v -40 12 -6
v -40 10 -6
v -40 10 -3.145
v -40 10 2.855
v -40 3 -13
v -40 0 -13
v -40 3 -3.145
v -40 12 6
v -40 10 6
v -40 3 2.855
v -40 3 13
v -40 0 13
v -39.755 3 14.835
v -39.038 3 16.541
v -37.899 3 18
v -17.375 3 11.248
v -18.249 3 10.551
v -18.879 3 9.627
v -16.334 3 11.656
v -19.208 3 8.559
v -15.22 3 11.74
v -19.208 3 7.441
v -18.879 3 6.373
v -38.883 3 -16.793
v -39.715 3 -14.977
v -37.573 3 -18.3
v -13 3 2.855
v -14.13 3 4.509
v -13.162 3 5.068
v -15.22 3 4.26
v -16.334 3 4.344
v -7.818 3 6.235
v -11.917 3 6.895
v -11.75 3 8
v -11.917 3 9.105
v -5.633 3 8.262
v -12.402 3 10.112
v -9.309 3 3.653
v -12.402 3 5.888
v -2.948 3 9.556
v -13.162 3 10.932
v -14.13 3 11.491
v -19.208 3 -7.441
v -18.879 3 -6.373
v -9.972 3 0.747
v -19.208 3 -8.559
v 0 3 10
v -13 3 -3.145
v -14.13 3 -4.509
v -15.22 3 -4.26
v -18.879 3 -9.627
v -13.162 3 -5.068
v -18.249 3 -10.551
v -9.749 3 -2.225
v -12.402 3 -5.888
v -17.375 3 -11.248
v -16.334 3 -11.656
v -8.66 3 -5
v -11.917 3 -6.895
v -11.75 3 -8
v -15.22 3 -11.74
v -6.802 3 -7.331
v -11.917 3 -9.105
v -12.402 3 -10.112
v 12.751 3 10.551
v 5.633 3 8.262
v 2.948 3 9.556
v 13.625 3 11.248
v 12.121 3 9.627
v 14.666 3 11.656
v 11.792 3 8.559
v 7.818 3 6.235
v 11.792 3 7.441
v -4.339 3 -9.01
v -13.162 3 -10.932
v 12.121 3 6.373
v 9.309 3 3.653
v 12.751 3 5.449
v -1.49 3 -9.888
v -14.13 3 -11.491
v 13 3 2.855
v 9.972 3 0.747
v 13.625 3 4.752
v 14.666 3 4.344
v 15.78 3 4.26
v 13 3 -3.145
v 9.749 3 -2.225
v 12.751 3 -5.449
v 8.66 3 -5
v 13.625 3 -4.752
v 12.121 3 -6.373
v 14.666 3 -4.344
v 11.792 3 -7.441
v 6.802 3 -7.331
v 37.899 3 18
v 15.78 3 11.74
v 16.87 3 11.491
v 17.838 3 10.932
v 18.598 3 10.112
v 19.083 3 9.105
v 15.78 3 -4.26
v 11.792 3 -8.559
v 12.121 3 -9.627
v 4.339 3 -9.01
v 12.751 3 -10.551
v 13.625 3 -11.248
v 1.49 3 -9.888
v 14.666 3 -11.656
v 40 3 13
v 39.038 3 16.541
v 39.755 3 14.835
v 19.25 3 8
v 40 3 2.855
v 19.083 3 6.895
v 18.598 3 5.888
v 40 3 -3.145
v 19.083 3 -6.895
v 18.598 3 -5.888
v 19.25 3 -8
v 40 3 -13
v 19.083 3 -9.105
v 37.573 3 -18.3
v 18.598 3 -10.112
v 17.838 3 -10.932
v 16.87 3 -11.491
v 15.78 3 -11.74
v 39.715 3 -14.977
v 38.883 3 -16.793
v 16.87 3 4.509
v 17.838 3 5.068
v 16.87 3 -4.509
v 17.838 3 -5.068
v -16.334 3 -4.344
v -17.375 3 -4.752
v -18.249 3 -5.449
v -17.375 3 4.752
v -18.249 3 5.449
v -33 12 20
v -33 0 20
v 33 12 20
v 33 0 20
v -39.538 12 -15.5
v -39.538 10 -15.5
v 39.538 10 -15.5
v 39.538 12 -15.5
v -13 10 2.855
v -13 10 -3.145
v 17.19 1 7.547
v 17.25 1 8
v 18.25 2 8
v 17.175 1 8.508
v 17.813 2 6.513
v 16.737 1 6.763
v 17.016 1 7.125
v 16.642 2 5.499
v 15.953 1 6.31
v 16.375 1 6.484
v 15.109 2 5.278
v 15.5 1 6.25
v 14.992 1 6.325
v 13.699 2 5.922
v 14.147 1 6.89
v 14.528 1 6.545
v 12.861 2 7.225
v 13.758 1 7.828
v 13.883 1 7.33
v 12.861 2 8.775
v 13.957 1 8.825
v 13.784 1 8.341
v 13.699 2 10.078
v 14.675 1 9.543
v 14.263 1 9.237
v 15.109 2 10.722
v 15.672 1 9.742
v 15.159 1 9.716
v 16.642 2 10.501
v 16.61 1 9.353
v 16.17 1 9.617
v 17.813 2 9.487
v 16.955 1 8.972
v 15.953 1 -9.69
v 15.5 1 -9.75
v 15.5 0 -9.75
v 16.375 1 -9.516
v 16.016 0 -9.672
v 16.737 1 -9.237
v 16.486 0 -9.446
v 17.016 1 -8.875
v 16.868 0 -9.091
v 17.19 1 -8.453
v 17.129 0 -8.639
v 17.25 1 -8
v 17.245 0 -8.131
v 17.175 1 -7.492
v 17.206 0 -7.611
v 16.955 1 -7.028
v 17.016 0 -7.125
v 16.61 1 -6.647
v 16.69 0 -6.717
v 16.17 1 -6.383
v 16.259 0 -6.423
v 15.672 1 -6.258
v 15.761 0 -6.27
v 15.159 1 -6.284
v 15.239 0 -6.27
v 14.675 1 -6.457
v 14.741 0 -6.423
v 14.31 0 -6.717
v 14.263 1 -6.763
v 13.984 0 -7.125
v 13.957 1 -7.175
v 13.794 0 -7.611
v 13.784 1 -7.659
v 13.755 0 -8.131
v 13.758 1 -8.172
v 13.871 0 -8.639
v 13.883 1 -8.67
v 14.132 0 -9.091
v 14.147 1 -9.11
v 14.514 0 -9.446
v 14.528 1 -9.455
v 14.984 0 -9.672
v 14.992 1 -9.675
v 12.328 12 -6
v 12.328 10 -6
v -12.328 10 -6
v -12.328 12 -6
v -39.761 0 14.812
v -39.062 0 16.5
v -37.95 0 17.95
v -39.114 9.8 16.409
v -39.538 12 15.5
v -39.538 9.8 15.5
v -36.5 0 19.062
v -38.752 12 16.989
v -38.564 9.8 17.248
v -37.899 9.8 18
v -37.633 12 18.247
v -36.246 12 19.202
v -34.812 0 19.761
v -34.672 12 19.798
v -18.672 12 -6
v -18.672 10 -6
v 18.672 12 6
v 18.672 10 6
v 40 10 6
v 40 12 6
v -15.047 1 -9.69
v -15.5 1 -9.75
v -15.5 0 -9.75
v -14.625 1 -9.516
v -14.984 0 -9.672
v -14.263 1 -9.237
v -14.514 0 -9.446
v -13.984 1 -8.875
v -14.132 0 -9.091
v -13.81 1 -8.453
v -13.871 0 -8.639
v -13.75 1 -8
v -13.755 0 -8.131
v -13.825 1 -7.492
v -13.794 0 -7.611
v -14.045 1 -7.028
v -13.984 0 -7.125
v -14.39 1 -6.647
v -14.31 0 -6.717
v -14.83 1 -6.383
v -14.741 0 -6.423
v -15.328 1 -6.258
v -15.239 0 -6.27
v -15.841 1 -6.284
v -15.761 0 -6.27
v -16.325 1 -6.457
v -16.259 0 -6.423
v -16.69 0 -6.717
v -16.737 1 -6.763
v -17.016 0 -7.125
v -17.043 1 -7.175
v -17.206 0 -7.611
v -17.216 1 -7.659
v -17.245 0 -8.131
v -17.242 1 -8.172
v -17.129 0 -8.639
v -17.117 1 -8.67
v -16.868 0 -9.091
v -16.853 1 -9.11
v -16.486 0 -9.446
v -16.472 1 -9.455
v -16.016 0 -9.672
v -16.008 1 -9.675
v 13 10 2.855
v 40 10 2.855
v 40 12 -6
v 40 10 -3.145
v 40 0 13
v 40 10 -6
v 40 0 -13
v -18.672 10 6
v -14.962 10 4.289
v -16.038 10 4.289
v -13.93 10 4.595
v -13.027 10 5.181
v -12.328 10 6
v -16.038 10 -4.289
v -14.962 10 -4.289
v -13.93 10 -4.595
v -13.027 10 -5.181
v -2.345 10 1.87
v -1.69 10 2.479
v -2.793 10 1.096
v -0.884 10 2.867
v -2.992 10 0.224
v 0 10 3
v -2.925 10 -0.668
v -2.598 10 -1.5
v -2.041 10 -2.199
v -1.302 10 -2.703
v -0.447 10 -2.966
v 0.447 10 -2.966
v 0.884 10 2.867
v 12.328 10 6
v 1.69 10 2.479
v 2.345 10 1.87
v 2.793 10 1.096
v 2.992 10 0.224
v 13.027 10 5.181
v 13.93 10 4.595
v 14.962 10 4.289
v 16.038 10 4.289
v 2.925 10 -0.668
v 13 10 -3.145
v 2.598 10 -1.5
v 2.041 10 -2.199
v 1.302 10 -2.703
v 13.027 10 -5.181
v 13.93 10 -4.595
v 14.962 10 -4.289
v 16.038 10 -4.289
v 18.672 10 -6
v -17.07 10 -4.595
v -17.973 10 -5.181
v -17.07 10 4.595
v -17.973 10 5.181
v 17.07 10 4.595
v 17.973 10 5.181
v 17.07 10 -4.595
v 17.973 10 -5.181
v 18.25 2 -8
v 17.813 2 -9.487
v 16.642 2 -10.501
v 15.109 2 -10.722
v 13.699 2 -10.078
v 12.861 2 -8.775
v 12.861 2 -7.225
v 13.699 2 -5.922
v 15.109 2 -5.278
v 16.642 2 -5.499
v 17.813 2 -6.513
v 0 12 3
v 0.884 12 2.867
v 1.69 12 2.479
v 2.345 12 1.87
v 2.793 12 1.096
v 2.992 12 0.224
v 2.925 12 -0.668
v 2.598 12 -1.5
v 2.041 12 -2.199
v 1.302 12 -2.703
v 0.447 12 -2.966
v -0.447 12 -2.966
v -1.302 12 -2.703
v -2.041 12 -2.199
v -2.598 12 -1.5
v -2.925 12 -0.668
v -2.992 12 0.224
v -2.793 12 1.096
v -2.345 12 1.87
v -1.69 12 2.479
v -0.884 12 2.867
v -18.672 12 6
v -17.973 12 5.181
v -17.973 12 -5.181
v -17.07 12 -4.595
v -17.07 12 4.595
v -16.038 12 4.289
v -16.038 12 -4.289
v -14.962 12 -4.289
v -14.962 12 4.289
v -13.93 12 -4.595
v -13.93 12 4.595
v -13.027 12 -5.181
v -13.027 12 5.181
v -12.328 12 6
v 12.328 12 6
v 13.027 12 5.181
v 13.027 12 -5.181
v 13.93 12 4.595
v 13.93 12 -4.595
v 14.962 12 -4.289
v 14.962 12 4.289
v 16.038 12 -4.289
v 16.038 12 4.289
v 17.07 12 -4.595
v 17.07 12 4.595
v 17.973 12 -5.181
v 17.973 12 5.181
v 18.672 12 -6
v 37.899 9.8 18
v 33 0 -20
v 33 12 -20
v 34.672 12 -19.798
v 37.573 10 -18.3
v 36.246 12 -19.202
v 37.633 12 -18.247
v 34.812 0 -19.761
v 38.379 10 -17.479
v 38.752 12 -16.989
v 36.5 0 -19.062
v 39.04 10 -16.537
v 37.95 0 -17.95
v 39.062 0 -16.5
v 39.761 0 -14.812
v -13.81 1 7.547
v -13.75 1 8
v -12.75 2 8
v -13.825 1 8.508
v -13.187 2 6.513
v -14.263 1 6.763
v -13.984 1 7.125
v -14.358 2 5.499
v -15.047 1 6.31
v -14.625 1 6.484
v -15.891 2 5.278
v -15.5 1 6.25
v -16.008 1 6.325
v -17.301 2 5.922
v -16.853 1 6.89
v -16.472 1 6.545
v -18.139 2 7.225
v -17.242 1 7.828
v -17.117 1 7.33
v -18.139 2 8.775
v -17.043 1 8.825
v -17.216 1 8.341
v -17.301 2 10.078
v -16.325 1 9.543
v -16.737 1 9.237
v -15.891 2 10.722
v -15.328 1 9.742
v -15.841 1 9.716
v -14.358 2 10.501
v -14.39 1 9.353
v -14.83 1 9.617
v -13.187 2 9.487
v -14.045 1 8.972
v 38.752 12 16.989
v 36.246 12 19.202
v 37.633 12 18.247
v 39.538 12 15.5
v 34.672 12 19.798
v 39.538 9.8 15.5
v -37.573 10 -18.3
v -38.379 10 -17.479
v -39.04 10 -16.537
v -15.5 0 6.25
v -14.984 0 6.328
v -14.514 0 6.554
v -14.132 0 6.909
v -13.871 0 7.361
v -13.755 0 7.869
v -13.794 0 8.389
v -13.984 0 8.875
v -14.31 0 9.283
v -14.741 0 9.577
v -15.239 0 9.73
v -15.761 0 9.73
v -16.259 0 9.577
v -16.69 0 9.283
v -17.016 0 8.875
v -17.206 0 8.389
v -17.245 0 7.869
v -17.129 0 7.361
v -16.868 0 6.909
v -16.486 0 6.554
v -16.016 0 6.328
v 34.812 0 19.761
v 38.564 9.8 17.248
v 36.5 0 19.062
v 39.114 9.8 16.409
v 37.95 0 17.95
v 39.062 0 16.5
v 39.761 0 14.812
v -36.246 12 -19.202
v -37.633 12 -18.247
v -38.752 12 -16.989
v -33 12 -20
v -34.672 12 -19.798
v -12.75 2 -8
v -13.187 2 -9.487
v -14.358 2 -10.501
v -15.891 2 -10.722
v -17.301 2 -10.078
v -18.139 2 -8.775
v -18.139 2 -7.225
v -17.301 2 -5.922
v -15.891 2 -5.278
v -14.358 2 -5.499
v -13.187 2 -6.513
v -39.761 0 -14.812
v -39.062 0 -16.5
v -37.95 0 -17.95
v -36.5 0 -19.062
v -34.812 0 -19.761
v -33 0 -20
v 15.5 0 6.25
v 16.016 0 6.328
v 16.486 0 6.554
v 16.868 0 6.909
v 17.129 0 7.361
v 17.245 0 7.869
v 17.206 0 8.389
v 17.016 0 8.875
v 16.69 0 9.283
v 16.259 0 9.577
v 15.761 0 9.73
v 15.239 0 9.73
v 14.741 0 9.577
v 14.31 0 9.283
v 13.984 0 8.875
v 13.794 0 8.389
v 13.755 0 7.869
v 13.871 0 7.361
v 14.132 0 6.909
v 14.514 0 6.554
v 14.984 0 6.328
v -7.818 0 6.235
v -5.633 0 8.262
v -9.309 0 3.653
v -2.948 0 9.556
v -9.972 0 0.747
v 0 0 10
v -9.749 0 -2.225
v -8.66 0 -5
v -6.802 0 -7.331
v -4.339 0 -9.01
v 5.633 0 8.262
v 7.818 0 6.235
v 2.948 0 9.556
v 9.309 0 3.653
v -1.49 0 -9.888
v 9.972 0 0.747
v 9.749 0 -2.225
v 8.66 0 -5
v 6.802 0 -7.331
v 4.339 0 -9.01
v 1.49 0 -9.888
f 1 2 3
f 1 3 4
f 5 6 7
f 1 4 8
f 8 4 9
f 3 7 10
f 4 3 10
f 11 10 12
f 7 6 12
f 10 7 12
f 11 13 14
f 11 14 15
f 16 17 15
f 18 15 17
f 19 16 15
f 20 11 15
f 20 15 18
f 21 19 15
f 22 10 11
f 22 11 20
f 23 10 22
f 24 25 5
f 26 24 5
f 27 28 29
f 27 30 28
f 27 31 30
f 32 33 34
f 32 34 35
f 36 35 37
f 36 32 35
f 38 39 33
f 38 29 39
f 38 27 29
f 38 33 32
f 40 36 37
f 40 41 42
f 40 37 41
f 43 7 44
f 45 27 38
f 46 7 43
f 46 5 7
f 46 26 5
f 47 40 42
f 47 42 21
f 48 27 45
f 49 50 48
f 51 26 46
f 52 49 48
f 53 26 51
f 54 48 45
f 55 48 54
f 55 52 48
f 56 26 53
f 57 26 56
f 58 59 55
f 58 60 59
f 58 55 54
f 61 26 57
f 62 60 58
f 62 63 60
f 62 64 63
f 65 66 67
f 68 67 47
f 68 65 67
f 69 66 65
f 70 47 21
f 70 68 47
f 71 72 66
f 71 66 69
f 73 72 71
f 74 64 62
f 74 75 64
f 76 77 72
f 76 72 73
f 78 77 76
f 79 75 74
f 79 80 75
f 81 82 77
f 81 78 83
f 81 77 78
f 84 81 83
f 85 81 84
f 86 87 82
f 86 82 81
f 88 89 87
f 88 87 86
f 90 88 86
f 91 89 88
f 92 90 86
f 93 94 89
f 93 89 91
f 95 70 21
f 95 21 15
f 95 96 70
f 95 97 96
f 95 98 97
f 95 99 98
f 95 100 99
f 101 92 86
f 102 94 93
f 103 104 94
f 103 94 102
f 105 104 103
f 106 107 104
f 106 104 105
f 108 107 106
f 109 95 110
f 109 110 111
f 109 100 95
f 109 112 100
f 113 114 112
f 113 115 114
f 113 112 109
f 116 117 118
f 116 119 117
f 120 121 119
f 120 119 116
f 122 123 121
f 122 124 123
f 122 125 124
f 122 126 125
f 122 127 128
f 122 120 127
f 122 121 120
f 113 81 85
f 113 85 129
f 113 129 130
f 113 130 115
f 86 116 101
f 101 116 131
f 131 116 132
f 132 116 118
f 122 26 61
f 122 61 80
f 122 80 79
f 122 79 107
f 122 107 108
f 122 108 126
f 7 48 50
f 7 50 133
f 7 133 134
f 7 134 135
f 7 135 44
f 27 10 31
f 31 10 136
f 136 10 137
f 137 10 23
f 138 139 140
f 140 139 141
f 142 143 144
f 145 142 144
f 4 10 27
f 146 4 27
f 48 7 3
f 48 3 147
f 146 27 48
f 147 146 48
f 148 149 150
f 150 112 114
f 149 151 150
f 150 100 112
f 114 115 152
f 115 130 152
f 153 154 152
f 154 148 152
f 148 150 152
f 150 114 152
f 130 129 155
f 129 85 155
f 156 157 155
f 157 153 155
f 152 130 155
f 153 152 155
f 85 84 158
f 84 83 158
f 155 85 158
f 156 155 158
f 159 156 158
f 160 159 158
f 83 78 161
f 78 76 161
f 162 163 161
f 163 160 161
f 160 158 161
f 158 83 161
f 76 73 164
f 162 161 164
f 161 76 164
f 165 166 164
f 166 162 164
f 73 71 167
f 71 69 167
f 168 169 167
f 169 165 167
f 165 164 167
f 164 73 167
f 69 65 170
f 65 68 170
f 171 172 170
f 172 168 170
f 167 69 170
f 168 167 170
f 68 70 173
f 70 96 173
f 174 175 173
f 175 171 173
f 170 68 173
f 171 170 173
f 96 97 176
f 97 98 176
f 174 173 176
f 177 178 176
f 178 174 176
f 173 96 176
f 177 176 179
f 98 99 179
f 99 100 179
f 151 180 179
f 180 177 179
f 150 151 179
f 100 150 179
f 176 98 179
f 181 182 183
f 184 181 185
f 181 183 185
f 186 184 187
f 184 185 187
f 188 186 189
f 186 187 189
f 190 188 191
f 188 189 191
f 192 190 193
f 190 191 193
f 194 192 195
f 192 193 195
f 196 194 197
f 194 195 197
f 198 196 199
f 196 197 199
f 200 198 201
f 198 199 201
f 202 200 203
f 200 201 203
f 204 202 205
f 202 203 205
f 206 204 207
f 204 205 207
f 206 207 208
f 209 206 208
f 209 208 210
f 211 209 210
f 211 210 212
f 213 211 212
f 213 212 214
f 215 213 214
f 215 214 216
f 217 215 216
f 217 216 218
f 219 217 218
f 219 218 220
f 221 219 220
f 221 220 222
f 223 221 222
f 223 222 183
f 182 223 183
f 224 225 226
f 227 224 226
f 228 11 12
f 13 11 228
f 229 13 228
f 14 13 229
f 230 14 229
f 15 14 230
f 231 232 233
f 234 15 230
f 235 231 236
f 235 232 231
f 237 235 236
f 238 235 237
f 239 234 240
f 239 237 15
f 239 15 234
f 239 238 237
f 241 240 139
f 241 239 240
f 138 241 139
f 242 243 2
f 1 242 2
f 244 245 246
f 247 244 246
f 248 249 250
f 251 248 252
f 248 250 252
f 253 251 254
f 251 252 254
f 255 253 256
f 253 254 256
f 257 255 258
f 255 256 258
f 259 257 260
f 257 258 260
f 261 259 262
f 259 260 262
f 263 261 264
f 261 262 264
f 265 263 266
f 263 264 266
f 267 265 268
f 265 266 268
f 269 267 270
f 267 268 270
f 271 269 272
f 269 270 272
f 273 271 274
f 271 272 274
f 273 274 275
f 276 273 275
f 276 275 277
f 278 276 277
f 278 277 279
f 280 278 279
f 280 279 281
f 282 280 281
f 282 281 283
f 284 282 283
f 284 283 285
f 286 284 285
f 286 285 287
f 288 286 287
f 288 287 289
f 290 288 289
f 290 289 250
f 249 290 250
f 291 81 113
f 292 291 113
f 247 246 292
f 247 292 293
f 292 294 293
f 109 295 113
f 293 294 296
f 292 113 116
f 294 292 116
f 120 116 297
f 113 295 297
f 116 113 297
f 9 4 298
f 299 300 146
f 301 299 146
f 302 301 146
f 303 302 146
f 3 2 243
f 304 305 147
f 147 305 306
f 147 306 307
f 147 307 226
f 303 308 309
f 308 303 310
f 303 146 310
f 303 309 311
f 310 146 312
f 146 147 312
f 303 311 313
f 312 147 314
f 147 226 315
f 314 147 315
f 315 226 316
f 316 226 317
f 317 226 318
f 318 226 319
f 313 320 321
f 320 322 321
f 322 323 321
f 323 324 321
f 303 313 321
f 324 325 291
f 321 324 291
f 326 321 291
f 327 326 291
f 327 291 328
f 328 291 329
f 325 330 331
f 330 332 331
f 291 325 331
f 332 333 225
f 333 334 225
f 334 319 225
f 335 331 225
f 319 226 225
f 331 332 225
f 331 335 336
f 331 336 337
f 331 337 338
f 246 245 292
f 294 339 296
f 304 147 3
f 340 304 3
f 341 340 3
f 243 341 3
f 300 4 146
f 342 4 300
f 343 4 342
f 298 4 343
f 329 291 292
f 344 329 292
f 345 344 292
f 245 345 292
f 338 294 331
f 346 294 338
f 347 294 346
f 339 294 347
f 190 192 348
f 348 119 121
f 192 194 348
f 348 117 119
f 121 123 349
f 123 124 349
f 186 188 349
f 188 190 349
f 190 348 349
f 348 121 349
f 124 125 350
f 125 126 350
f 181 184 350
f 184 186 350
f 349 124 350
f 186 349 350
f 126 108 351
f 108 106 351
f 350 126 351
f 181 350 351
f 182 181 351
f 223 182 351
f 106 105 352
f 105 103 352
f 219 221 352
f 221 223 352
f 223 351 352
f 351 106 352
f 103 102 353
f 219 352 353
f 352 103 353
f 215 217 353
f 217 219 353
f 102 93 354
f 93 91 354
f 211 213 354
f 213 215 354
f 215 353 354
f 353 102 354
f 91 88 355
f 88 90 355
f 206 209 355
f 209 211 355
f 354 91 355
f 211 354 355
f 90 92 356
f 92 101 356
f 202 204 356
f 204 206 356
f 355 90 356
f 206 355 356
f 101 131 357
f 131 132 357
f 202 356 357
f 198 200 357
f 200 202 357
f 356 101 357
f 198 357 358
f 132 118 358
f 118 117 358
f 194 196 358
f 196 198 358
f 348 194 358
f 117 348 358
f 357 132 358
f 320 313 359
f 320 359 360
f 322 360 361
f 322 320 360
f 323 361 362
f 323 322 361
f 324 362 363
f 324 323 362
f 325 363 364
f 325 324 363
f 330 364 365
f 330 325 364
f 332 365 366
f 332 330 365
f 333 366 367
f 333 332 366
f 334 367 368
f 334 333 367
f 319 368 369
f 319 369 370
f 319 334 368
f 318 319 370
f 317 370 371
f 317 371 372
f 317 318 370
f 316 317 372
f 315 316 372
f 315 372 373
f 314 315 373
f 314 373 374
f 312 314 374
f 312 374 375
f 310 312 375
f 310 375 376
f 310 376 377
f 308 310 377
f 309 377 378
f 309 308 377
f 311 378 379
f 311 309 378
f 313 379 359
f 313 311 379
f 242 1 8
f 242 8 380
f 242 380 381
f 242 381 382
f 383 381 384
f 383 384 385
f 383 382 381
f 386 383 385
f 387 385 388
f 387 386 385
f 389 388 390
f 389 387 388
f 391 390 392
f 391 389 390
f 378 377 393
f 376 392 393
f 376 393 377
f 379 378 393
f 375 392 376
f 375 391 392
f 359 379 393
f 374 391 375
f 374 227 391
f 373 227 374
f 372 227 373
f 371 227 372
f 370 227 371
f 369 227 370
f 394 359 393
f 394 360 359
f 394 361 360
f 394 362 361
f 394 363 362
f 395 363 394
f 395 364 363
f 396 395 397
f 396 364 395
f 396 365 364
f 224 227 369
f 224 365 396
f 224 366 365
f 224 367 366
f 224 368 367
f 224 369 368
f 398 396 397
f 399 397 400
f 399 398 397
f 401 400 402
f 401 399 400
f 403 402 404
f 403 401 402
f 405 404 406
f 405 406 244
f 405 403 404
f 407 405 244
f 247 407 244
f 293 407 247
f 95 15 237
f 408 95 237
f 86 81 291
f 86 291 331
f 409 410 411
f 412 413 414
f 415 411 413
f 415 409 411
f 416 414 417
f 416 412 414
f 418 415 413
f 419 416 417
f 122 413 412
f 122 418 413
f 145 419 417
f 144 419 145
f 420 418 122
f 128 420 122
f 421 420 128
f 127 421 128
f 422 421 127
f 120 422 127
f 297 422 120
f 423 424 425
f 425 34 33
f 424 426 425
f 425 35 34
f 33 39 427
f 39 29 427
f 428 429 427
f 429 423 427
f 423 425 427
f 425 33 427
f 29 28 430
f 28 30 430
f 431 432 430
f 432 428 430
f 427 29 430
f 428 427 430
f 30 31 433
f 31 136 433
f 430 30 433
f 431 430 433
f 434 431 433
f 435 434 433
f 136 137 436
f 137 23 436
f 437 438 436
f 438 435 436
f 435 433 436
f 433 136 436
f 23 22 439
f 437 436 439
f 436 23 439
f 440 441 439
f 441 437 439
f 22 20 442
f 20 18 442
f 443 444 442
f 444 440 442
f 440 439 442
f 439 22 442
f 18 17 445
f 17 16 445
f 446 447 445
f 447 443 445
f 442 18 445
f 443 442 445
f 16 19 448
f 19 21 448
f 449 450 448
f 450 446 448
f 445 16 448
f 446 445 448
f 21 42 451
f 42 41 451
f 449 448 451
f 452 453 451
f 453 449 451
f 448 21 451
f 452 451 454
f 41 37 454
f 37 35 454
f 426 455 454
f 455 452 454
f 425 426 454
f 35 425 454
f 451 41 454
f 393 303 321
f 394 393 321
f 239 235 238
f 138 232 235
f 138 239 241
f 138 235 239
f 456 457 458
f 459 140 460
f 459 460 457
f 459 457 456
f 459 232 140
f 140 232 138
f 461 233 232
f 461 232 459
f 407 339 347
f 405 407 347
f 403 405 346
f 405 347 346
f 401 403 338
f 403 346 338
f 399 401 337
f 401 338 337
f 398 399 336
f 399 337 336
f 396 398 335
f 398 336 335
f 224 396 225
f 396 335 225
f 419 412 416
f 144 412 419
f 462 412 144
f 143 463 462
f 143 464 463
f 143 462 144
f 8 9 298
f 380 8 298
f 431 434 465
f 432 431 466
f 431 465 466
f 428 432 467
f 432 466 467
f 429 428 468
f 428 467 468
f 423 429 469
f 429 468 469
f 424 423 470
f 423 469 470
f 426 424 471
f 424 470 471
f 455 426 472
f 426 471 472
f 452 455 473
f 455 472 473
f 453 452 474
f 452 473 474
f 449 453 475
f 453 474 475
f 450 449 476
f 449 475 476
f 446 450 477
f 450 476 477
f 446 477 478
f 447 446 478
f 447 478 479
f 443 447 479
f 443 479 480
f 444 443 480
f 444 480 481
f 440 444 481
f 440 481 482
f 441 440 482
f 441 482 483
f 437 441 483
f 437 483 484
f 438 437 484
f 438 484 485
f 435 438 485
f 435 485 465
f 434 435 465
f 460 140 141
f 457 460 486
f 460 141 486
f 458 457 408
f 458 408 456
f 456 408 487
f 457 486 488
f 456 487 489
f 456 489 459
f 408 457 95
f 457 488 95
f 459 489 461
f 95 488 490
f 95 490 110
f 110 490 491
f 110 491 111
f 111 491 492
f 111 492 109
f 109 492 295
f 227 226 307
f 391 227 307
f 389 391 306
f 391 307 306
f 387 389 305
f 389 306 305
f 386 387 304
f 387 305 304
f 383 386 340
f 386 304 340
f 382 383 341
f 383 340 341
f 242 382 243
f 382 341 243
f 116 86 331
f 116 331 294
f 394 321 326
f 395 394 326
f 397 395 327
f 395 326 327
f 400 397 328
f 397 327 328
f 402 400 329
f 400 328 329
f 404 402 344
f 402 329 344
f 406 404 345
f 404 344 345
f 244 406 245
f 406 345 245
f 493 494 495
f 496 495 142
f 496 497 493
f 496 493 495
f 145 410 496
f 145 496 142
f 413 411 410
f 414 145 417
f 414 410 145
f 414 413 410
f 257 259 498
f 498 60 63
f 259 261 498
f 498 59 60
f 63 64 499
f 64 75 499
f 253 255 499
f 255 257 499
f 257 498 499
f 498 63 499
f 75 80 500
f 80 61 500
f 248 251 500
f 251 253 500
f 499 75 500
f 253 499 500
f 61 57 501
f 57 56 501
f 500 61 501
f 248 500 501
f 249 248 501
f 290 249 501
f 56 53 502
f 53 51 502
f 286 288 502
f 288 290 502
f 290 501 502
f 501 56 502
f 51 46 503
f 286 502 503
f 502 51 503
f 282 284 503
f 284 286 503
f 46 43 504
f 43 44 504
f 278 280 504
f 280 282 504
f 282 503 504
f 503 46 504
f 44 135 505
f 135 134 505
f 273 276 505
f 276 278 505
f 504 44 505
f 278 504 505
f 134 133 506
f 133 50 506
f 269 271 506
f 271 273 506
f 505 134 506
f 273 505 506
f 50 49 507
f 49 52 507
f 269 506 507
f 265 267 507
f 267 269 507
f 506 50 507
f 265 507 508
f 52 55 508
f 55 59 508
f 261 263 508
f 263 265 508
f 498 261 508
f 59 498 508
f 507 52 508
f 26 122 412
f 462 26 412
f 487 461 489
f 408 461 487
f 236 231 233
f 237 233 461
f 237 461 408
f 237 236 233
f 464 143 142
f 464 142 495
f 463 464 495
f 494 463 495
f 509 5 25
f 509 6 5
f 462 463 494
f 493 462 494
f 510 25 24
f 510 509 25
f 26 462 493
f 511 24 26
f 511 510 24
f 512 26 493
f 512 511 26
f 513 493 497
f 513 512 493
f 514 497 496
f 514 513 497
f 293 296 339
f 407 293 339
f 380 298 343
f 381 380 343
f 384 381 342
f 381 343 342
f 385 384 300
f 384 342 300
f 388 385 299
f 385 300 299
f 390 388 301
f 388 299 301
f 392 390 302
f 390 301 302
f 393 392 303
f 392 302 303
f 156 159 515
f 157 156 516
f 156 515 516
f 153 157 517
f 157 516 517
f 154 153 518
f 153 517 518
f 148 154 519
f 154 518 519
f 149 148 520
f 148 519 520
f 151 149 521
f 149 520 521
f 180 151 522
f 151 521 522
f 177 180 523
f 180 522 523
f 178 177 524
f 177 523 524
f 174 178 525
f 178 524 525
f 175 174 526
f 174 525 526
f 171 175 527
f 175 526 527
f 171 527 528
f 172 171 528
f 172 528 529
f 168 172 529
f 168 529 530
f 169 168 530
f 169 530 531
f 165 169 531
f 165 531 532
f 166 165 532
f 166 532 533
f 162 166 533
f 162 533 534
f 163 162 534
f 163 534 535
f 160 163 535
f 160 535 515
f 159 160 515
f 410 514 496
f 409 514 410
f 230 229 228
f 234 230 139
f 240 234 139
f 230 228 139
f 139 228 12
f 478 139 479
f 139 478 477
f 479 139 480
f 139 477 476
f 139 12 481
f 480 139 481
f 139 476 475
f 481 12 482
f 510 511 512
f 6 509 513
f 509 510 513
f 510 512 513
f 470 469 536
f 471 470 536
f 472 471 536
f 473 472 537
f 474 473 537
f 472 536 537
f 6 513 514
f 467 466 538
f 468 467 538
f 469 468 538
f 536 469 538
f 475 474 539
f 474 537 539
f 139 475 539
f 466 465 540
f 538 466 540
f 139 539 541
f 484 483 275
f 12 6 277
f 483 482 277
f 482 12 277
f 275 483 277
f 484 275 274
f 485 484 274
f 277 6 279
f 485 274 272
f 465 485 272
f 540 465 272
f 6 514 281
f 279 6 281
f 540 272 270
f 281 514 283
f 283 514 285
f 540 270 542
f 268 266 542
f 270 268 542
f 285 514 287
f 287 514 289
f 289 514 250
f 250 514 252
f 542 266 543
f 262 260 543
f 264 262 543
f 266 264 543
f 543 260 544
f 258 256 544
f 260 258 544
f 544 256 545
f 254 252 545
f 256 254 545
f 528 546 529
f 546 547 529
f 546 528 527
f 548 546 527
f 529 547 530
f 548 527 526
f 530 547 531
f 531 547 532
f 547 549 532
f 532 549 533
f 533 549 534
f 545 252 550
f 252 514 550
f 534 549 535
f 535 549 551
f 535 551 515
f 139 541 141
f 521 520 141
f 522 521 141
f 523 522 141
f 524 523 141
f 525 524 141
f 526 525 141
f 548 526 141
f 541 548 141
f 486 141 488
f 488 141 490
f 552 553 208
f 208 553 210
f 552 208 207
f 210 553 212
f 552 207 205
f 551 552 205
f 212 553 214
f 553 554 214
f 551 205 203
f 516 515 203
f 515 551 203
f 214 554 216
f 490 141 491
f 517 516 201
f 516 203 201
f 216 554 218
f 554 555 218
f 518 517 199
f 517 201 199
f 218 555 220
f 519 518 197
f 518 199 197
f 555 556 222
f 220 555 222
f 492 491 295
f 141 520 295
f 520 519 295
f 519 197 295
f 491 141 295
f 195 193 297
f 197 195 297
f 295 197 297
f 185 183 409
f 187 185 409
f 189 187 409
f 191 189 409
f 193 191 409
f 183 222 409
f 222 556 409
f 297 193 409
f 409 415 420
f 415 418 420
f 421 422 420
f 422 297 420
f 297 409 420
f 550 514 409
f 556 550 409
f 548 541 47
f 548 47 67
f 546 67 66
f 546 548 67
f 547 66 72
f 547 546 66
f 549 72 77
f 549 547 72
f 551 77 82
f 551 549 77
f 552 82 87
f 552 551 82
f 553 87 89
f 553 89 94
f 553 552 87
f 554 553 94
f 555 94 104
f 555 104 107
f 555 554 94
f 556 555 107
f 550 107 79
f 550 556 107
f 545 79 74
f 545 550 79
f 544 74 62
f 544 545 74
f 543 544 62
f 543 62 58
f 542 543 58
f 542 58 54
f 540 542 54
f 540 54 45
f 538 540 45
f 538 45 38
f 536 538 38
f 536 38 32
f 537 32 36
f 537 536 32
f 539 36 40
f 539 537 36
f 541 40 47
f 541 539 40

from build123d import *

# Parameters (mm, degrees)
SKETCH1_W                    = 80
SKETCH1_H                    = 40
SKETCH1_R                    = 10
BOSS_EXTRUDE1_DEPTH          = 3
SKETCH2_W                    = 80
SKETCH2_H                    = 4.5
BOSS_EXTRUDE2_DEPTH          = 9
SKETCH3_W                    = 2.8
SKETCH3_H                    = 7
SKETCH3_W_2                  = 2.5
SKETCH3_H_2                  = 6.8
CUT_EXTRUDE1_DEPTH           = 80
SKETCH5_R                    = 1.75
CUT_EXTRUDE3_DEPTH           = 1
SKETCH4_R                    = 3.75
CUT_EXTRUDE4_DEPTH           = 2
CUT_EXTRUDE4_DRAFT           = -45
CUT_EXTRUDE4_PROFILE_2_DEPTH = 2
CUT_EXTRUDE4_PROFILE_2_DRAFT = -45
CUT_EXTRUDE4_PROFILE_3_DEPTH = 2
CUT_EXTRUDE4_PROFILE_3_DRAFT = -45
CUT_EXTRUDE4_PROFILE_4_DEPTH = 2
CUT_EXTRUDE4_PROFILE_4_DRAFT = -45
FILLET1_R                    = 7
SKETCH6_W                    = 27
SKETCH6_H                    = 6
BOSS_EXTRUDE3_DEPTH          = 7
SKETCH7_R                    = 3
BOSS_EXTRUDE4_DEPTH          = 2


with BuildPart() as part:
    # Sketch1 → Boss-Extrude1 (new body)
    with BuildSketch(Plane(origin=(0, 0, 0), x_dir=(1, 0, 0), z_dir=(0, 1, 0))):
        Rectangle(SKETCH1_W, SKETCH1_H)
        with Locations(Location((0, 0, 0), (0, 0, 270))):
            Circle(SKETCH1_R, mode=Mode.SUBTRACT)
    extrude(amount=BOSS_EXTRUDE1_DEPTH)

    # Sketch2 → Boss-Extrude2 (add)
    with BuildSketch(Plane(origin=(0, 3, 0), x_dir=(1, 0, 0), z_dir=(0, 1, 0))):
        with Locations((0, 17.75)):
            Rectangle(SKETCH2_W, SKETCH2_H)
        with Locations((0, -17.75)):
            Rectangle(SKETCH2_W, SKETCH2_H)
    extrude(amount=BOSS_EXTRUDE2_DEPTH)

    # Sketch3 → Cut-Extrude1 (cut)
    with BuildSketch(Plane.ZY.offset(40)):
        with Locations((-16.9, 6.5)):
            Rectangle(SKETCH3_W, SKETCH3_H)
        with Locations((16.75, 6.4)):
            Rectangle(SKETCH3_W_2, SKETCH3_H_2)
    extrude(amount=-CUT_EXTRUDE1_DEPTH, mode=Mode.SUBTRACT)

    # Sketch5 → Cut-Extrude3 (cut)
    with BuildSketch(Plane.XZ):
        with Locations(Location((-15.5, 8, 0), (0, 0, 270))):
            Circle(SKETCH5_R)
        with Locations(Location((-15.5, -8, 0), (0, 0, 270))):
            Circle(SKETCH5_R)
        with Locations(Location((15.5, 8, 0), (0, 0, 270))):
            Circle(SKETCH5_R)
        with Locations(Location((15.5, -8, 0), (0, 0, 270))):
            Circle(SKETCH5_R)
    extrude(amount=-CUT_EXTRUDE3_DEPTH, mode=Mode.SUBTRACT)


with BuildPart() as cut_extrude4_tool:
    # Sketch4 → Cut-Extrude4 (with draft: the straight prism first)
    with BuildSketch(Plane(origin=(0, 3, 0), x_dir=(1, 0, 0), z_dir=(0, 1, 0))):
        with Locations((-15.5, 8)):
            Circle(SKETCH4_R)
    extrude(amount=-CUT_EXTRUDE4_DEPTH)
    # Cut-Extrude4: the draft: its side faces are tilted about the plane it starts from
    cut_extrude4_sides = [cut_extrude4_tool.faces().sort_by_distance(p)[0] for p in [
        (-19.25, 2, -8),
    ]]
    draft(cut_extrude4_sides, Plane(origin=(0, 3, 0), x_dir=(1, 0, 0), z_dir=(0, 1, 0)), CUT_EXTRUDE4_DRAFT)


with BuildPart() as part_1:
    add(part.part)

    # Cut-Extrude4: cut by cut_extrude4_tool
    add(cut_extrude4_tool.part, mode=Mode.SUBTRACT)


with BuildPart() as cut_extrude4_profile_2_tool:
    # Sketch4 → Cut-Extrude4 profile 2 (with draft: the straight prism first)
    with BuildSketch(Plane(origin=(0, 3, 0), x_dir=(1, 0, 0), z_dir=(0, 1, 0))):
        with Locations((-15.5, -8)):
            Circle(SKETCH4_R)
    extrude(amount=-CUT_EXTRUDE4_PROFILE_2_DEPTH)
    # Cut-Extrude4 profile 2: the draft: its side faces are tilted about the plane it starts from
    cut_extrude4_profile_2_sides = [cut_extrude4_profile_2_tool.faces().sort_by_distance(p)[0] for p in [
        (-19.25, 2, 8),
    ]]
    draft(cut_extrude4_profile_2_sides, Plane(origin=(0, 3, 0), x_dir=(1, 0, 0), z_dir=(0, 1, 0)), CUT_EXTRUDE4_PROFILE_2_DRAFT)


with BuildPart() as part_2:
    add(part_1.part)

    # Cut-Extrude4 profile 2: cut by cut_extrude4_profile_2_tool
    add(cut_extrude4_profile_2_tool.part, mode=Mode.SUBTRACT)


with BuildPart() as cut_extrude4_profile_3_tool:
    # Sketch4 → Cut-Extrude4 profile 3 (with draft: the straight prism first)
    with BuildSketch(Plane(origin=(0, 3, 0), x_dir=(1, 0, 0), z_dir=(0, 1, 0))):
        with Locations((15.5, -8)):
            Circle(SKETCH4_R)
    extrude(amount=-CUT_EXTRUDE4_PROFILE_3_DEPTH)
    # Cut-Extrude4 profile 3: the draft: its side faces are tilted about the plane it starts from
    cut_extrude4_profile_3_sides = [cut_extrude4_profile_3_tool.faces().sort_by_distance(p)[0] for p in [
        (11.75, 2, 8),
    ]]
    draft(cut_extrude4_profile_3_sides, Plane(origin=(0, 3, 0), x_dir=(1, 0, 0), z_dir=(0, 1, 0)), CUT_EXTRUDE4_PROFILE_3_DRAFT)


with BuildPart() as part_3:
    add(part_2.part)

    # Cut-Extrude4 profile 3: cut by cut_extrude4_profile_3_tool
    add(cut_extrude4_profile_3_tool.part, mode=Mode.SUBTRACT)


with BuildPart() as cut_extrude4_profile_4_tool:
    # Sketch4 → Cut-Extrude4 profile 4 (with draft: the straight prism first)
    with BuildSketch(Plane(origin=(0, 3, 0), x_dir=(1, 0, 0), z_dir=(0, 1, 0))):
        with Locations((15.5, 8)):
            Circle(SKETCH4_R)
    extrude(amount=-CUT_EXTRUDE4_PROFILE_4_DEPTH)
    # Cut-Extrude4 profile 4: the draft: its side faces are tilted about the plane it starts from
    cut_extrude4_profile_4_sides = [cut_extrude4_profile_4_tool.faces().sort_by_distance(p)[0] for p in [
        (11.75, 2, -8),
    ]]
    draft(cut_extrude4_profile_4_sides, Plane(origin=(0, 3, 0), x_dir=(1, 0, 0), z_dir=(0, 1, 0)), CUT_EXTRUDE4_PROFILE_4_DRAFT)


with BuildPart() as part_4:
    add(part_3.part)

    # Cut-Extrude4 profile 4: cut by cut_extrude4_profile_4_tool
    add(cut_extrude4_profile_4_tool.part, mode=Mode.SUBTRACT)

    # Fillet1
    fillet1_edges = [part_4.edges().sort_by_distance(p)[0] for p in [
        (40, 6, 20),
        (40, 6, -20),
        (-40, 6, 20),
        (-40, 6, -20),
    ]]
    fillet(fillet1_edges, radius=FILLET1_R)

    # Sketch6 → Boss-Extrude3 (add)
    with BuildSketch(Plane(origin=(0, 3, 0), x_dir=(1, 0, 0), z_dir=(0, 1, 0))):
        with Locations((-26.5, 0.145287111)):
            Rectangle(SKETCH6_W, SKETCH6_H)
        with Locations((26.5, 0.145287111)):
            Rectangle(SKETCH6_W, SKETCH6_H)
    extrude(amount=BOSS_EXTRUDE3_DEPTH)

    # Sketch7 → Boss-Extrude4 (add)
    with BuildSketch(Plane(origin=(0, 10, 0), x_dir=(1, 0, 0), z_dir=(0, 1, 0))):
        with BuildLine():
            Line((40, 6), (18.672144385, 6))
            ThreePointArc((18.672144385, 6), (15.5, 4.25), (12.327855615, 6))
            Line((12.327855615, 6), (-12.327855615, 6))
            ThreePointArc((-12.327855615, 6), (-15.5, 4.25), (-18.672144385, 6))
            Line((-18.672144385, 6), (-40, 6))
            Line((-40, 6), (-40, -6))
            Line((-40, -6), (-18.672144385, -6))
            ThreePointArc((-18.672144385, -6), (-15.5, -4.25), (-12.327855615, -6))
            Line((-12.327855615, -6), (12.327855615, -6))
            ThreePointArc((12.327855615, -6), (15.5, -4.25), (18.672144385, -6))
            Line((18.672144385, -6), (40, -6))
            Line((40, -6), (40, 6))
        make_face()
        with Locations(Location((0, 0, 0), (0, 0, 270))):
            Circle(SKETCH7_R, mode=Mode.SUBTRACT)
    extrude(amount=BOSS_EXTRUDE4_DEPTH)


solid = part_4.part
